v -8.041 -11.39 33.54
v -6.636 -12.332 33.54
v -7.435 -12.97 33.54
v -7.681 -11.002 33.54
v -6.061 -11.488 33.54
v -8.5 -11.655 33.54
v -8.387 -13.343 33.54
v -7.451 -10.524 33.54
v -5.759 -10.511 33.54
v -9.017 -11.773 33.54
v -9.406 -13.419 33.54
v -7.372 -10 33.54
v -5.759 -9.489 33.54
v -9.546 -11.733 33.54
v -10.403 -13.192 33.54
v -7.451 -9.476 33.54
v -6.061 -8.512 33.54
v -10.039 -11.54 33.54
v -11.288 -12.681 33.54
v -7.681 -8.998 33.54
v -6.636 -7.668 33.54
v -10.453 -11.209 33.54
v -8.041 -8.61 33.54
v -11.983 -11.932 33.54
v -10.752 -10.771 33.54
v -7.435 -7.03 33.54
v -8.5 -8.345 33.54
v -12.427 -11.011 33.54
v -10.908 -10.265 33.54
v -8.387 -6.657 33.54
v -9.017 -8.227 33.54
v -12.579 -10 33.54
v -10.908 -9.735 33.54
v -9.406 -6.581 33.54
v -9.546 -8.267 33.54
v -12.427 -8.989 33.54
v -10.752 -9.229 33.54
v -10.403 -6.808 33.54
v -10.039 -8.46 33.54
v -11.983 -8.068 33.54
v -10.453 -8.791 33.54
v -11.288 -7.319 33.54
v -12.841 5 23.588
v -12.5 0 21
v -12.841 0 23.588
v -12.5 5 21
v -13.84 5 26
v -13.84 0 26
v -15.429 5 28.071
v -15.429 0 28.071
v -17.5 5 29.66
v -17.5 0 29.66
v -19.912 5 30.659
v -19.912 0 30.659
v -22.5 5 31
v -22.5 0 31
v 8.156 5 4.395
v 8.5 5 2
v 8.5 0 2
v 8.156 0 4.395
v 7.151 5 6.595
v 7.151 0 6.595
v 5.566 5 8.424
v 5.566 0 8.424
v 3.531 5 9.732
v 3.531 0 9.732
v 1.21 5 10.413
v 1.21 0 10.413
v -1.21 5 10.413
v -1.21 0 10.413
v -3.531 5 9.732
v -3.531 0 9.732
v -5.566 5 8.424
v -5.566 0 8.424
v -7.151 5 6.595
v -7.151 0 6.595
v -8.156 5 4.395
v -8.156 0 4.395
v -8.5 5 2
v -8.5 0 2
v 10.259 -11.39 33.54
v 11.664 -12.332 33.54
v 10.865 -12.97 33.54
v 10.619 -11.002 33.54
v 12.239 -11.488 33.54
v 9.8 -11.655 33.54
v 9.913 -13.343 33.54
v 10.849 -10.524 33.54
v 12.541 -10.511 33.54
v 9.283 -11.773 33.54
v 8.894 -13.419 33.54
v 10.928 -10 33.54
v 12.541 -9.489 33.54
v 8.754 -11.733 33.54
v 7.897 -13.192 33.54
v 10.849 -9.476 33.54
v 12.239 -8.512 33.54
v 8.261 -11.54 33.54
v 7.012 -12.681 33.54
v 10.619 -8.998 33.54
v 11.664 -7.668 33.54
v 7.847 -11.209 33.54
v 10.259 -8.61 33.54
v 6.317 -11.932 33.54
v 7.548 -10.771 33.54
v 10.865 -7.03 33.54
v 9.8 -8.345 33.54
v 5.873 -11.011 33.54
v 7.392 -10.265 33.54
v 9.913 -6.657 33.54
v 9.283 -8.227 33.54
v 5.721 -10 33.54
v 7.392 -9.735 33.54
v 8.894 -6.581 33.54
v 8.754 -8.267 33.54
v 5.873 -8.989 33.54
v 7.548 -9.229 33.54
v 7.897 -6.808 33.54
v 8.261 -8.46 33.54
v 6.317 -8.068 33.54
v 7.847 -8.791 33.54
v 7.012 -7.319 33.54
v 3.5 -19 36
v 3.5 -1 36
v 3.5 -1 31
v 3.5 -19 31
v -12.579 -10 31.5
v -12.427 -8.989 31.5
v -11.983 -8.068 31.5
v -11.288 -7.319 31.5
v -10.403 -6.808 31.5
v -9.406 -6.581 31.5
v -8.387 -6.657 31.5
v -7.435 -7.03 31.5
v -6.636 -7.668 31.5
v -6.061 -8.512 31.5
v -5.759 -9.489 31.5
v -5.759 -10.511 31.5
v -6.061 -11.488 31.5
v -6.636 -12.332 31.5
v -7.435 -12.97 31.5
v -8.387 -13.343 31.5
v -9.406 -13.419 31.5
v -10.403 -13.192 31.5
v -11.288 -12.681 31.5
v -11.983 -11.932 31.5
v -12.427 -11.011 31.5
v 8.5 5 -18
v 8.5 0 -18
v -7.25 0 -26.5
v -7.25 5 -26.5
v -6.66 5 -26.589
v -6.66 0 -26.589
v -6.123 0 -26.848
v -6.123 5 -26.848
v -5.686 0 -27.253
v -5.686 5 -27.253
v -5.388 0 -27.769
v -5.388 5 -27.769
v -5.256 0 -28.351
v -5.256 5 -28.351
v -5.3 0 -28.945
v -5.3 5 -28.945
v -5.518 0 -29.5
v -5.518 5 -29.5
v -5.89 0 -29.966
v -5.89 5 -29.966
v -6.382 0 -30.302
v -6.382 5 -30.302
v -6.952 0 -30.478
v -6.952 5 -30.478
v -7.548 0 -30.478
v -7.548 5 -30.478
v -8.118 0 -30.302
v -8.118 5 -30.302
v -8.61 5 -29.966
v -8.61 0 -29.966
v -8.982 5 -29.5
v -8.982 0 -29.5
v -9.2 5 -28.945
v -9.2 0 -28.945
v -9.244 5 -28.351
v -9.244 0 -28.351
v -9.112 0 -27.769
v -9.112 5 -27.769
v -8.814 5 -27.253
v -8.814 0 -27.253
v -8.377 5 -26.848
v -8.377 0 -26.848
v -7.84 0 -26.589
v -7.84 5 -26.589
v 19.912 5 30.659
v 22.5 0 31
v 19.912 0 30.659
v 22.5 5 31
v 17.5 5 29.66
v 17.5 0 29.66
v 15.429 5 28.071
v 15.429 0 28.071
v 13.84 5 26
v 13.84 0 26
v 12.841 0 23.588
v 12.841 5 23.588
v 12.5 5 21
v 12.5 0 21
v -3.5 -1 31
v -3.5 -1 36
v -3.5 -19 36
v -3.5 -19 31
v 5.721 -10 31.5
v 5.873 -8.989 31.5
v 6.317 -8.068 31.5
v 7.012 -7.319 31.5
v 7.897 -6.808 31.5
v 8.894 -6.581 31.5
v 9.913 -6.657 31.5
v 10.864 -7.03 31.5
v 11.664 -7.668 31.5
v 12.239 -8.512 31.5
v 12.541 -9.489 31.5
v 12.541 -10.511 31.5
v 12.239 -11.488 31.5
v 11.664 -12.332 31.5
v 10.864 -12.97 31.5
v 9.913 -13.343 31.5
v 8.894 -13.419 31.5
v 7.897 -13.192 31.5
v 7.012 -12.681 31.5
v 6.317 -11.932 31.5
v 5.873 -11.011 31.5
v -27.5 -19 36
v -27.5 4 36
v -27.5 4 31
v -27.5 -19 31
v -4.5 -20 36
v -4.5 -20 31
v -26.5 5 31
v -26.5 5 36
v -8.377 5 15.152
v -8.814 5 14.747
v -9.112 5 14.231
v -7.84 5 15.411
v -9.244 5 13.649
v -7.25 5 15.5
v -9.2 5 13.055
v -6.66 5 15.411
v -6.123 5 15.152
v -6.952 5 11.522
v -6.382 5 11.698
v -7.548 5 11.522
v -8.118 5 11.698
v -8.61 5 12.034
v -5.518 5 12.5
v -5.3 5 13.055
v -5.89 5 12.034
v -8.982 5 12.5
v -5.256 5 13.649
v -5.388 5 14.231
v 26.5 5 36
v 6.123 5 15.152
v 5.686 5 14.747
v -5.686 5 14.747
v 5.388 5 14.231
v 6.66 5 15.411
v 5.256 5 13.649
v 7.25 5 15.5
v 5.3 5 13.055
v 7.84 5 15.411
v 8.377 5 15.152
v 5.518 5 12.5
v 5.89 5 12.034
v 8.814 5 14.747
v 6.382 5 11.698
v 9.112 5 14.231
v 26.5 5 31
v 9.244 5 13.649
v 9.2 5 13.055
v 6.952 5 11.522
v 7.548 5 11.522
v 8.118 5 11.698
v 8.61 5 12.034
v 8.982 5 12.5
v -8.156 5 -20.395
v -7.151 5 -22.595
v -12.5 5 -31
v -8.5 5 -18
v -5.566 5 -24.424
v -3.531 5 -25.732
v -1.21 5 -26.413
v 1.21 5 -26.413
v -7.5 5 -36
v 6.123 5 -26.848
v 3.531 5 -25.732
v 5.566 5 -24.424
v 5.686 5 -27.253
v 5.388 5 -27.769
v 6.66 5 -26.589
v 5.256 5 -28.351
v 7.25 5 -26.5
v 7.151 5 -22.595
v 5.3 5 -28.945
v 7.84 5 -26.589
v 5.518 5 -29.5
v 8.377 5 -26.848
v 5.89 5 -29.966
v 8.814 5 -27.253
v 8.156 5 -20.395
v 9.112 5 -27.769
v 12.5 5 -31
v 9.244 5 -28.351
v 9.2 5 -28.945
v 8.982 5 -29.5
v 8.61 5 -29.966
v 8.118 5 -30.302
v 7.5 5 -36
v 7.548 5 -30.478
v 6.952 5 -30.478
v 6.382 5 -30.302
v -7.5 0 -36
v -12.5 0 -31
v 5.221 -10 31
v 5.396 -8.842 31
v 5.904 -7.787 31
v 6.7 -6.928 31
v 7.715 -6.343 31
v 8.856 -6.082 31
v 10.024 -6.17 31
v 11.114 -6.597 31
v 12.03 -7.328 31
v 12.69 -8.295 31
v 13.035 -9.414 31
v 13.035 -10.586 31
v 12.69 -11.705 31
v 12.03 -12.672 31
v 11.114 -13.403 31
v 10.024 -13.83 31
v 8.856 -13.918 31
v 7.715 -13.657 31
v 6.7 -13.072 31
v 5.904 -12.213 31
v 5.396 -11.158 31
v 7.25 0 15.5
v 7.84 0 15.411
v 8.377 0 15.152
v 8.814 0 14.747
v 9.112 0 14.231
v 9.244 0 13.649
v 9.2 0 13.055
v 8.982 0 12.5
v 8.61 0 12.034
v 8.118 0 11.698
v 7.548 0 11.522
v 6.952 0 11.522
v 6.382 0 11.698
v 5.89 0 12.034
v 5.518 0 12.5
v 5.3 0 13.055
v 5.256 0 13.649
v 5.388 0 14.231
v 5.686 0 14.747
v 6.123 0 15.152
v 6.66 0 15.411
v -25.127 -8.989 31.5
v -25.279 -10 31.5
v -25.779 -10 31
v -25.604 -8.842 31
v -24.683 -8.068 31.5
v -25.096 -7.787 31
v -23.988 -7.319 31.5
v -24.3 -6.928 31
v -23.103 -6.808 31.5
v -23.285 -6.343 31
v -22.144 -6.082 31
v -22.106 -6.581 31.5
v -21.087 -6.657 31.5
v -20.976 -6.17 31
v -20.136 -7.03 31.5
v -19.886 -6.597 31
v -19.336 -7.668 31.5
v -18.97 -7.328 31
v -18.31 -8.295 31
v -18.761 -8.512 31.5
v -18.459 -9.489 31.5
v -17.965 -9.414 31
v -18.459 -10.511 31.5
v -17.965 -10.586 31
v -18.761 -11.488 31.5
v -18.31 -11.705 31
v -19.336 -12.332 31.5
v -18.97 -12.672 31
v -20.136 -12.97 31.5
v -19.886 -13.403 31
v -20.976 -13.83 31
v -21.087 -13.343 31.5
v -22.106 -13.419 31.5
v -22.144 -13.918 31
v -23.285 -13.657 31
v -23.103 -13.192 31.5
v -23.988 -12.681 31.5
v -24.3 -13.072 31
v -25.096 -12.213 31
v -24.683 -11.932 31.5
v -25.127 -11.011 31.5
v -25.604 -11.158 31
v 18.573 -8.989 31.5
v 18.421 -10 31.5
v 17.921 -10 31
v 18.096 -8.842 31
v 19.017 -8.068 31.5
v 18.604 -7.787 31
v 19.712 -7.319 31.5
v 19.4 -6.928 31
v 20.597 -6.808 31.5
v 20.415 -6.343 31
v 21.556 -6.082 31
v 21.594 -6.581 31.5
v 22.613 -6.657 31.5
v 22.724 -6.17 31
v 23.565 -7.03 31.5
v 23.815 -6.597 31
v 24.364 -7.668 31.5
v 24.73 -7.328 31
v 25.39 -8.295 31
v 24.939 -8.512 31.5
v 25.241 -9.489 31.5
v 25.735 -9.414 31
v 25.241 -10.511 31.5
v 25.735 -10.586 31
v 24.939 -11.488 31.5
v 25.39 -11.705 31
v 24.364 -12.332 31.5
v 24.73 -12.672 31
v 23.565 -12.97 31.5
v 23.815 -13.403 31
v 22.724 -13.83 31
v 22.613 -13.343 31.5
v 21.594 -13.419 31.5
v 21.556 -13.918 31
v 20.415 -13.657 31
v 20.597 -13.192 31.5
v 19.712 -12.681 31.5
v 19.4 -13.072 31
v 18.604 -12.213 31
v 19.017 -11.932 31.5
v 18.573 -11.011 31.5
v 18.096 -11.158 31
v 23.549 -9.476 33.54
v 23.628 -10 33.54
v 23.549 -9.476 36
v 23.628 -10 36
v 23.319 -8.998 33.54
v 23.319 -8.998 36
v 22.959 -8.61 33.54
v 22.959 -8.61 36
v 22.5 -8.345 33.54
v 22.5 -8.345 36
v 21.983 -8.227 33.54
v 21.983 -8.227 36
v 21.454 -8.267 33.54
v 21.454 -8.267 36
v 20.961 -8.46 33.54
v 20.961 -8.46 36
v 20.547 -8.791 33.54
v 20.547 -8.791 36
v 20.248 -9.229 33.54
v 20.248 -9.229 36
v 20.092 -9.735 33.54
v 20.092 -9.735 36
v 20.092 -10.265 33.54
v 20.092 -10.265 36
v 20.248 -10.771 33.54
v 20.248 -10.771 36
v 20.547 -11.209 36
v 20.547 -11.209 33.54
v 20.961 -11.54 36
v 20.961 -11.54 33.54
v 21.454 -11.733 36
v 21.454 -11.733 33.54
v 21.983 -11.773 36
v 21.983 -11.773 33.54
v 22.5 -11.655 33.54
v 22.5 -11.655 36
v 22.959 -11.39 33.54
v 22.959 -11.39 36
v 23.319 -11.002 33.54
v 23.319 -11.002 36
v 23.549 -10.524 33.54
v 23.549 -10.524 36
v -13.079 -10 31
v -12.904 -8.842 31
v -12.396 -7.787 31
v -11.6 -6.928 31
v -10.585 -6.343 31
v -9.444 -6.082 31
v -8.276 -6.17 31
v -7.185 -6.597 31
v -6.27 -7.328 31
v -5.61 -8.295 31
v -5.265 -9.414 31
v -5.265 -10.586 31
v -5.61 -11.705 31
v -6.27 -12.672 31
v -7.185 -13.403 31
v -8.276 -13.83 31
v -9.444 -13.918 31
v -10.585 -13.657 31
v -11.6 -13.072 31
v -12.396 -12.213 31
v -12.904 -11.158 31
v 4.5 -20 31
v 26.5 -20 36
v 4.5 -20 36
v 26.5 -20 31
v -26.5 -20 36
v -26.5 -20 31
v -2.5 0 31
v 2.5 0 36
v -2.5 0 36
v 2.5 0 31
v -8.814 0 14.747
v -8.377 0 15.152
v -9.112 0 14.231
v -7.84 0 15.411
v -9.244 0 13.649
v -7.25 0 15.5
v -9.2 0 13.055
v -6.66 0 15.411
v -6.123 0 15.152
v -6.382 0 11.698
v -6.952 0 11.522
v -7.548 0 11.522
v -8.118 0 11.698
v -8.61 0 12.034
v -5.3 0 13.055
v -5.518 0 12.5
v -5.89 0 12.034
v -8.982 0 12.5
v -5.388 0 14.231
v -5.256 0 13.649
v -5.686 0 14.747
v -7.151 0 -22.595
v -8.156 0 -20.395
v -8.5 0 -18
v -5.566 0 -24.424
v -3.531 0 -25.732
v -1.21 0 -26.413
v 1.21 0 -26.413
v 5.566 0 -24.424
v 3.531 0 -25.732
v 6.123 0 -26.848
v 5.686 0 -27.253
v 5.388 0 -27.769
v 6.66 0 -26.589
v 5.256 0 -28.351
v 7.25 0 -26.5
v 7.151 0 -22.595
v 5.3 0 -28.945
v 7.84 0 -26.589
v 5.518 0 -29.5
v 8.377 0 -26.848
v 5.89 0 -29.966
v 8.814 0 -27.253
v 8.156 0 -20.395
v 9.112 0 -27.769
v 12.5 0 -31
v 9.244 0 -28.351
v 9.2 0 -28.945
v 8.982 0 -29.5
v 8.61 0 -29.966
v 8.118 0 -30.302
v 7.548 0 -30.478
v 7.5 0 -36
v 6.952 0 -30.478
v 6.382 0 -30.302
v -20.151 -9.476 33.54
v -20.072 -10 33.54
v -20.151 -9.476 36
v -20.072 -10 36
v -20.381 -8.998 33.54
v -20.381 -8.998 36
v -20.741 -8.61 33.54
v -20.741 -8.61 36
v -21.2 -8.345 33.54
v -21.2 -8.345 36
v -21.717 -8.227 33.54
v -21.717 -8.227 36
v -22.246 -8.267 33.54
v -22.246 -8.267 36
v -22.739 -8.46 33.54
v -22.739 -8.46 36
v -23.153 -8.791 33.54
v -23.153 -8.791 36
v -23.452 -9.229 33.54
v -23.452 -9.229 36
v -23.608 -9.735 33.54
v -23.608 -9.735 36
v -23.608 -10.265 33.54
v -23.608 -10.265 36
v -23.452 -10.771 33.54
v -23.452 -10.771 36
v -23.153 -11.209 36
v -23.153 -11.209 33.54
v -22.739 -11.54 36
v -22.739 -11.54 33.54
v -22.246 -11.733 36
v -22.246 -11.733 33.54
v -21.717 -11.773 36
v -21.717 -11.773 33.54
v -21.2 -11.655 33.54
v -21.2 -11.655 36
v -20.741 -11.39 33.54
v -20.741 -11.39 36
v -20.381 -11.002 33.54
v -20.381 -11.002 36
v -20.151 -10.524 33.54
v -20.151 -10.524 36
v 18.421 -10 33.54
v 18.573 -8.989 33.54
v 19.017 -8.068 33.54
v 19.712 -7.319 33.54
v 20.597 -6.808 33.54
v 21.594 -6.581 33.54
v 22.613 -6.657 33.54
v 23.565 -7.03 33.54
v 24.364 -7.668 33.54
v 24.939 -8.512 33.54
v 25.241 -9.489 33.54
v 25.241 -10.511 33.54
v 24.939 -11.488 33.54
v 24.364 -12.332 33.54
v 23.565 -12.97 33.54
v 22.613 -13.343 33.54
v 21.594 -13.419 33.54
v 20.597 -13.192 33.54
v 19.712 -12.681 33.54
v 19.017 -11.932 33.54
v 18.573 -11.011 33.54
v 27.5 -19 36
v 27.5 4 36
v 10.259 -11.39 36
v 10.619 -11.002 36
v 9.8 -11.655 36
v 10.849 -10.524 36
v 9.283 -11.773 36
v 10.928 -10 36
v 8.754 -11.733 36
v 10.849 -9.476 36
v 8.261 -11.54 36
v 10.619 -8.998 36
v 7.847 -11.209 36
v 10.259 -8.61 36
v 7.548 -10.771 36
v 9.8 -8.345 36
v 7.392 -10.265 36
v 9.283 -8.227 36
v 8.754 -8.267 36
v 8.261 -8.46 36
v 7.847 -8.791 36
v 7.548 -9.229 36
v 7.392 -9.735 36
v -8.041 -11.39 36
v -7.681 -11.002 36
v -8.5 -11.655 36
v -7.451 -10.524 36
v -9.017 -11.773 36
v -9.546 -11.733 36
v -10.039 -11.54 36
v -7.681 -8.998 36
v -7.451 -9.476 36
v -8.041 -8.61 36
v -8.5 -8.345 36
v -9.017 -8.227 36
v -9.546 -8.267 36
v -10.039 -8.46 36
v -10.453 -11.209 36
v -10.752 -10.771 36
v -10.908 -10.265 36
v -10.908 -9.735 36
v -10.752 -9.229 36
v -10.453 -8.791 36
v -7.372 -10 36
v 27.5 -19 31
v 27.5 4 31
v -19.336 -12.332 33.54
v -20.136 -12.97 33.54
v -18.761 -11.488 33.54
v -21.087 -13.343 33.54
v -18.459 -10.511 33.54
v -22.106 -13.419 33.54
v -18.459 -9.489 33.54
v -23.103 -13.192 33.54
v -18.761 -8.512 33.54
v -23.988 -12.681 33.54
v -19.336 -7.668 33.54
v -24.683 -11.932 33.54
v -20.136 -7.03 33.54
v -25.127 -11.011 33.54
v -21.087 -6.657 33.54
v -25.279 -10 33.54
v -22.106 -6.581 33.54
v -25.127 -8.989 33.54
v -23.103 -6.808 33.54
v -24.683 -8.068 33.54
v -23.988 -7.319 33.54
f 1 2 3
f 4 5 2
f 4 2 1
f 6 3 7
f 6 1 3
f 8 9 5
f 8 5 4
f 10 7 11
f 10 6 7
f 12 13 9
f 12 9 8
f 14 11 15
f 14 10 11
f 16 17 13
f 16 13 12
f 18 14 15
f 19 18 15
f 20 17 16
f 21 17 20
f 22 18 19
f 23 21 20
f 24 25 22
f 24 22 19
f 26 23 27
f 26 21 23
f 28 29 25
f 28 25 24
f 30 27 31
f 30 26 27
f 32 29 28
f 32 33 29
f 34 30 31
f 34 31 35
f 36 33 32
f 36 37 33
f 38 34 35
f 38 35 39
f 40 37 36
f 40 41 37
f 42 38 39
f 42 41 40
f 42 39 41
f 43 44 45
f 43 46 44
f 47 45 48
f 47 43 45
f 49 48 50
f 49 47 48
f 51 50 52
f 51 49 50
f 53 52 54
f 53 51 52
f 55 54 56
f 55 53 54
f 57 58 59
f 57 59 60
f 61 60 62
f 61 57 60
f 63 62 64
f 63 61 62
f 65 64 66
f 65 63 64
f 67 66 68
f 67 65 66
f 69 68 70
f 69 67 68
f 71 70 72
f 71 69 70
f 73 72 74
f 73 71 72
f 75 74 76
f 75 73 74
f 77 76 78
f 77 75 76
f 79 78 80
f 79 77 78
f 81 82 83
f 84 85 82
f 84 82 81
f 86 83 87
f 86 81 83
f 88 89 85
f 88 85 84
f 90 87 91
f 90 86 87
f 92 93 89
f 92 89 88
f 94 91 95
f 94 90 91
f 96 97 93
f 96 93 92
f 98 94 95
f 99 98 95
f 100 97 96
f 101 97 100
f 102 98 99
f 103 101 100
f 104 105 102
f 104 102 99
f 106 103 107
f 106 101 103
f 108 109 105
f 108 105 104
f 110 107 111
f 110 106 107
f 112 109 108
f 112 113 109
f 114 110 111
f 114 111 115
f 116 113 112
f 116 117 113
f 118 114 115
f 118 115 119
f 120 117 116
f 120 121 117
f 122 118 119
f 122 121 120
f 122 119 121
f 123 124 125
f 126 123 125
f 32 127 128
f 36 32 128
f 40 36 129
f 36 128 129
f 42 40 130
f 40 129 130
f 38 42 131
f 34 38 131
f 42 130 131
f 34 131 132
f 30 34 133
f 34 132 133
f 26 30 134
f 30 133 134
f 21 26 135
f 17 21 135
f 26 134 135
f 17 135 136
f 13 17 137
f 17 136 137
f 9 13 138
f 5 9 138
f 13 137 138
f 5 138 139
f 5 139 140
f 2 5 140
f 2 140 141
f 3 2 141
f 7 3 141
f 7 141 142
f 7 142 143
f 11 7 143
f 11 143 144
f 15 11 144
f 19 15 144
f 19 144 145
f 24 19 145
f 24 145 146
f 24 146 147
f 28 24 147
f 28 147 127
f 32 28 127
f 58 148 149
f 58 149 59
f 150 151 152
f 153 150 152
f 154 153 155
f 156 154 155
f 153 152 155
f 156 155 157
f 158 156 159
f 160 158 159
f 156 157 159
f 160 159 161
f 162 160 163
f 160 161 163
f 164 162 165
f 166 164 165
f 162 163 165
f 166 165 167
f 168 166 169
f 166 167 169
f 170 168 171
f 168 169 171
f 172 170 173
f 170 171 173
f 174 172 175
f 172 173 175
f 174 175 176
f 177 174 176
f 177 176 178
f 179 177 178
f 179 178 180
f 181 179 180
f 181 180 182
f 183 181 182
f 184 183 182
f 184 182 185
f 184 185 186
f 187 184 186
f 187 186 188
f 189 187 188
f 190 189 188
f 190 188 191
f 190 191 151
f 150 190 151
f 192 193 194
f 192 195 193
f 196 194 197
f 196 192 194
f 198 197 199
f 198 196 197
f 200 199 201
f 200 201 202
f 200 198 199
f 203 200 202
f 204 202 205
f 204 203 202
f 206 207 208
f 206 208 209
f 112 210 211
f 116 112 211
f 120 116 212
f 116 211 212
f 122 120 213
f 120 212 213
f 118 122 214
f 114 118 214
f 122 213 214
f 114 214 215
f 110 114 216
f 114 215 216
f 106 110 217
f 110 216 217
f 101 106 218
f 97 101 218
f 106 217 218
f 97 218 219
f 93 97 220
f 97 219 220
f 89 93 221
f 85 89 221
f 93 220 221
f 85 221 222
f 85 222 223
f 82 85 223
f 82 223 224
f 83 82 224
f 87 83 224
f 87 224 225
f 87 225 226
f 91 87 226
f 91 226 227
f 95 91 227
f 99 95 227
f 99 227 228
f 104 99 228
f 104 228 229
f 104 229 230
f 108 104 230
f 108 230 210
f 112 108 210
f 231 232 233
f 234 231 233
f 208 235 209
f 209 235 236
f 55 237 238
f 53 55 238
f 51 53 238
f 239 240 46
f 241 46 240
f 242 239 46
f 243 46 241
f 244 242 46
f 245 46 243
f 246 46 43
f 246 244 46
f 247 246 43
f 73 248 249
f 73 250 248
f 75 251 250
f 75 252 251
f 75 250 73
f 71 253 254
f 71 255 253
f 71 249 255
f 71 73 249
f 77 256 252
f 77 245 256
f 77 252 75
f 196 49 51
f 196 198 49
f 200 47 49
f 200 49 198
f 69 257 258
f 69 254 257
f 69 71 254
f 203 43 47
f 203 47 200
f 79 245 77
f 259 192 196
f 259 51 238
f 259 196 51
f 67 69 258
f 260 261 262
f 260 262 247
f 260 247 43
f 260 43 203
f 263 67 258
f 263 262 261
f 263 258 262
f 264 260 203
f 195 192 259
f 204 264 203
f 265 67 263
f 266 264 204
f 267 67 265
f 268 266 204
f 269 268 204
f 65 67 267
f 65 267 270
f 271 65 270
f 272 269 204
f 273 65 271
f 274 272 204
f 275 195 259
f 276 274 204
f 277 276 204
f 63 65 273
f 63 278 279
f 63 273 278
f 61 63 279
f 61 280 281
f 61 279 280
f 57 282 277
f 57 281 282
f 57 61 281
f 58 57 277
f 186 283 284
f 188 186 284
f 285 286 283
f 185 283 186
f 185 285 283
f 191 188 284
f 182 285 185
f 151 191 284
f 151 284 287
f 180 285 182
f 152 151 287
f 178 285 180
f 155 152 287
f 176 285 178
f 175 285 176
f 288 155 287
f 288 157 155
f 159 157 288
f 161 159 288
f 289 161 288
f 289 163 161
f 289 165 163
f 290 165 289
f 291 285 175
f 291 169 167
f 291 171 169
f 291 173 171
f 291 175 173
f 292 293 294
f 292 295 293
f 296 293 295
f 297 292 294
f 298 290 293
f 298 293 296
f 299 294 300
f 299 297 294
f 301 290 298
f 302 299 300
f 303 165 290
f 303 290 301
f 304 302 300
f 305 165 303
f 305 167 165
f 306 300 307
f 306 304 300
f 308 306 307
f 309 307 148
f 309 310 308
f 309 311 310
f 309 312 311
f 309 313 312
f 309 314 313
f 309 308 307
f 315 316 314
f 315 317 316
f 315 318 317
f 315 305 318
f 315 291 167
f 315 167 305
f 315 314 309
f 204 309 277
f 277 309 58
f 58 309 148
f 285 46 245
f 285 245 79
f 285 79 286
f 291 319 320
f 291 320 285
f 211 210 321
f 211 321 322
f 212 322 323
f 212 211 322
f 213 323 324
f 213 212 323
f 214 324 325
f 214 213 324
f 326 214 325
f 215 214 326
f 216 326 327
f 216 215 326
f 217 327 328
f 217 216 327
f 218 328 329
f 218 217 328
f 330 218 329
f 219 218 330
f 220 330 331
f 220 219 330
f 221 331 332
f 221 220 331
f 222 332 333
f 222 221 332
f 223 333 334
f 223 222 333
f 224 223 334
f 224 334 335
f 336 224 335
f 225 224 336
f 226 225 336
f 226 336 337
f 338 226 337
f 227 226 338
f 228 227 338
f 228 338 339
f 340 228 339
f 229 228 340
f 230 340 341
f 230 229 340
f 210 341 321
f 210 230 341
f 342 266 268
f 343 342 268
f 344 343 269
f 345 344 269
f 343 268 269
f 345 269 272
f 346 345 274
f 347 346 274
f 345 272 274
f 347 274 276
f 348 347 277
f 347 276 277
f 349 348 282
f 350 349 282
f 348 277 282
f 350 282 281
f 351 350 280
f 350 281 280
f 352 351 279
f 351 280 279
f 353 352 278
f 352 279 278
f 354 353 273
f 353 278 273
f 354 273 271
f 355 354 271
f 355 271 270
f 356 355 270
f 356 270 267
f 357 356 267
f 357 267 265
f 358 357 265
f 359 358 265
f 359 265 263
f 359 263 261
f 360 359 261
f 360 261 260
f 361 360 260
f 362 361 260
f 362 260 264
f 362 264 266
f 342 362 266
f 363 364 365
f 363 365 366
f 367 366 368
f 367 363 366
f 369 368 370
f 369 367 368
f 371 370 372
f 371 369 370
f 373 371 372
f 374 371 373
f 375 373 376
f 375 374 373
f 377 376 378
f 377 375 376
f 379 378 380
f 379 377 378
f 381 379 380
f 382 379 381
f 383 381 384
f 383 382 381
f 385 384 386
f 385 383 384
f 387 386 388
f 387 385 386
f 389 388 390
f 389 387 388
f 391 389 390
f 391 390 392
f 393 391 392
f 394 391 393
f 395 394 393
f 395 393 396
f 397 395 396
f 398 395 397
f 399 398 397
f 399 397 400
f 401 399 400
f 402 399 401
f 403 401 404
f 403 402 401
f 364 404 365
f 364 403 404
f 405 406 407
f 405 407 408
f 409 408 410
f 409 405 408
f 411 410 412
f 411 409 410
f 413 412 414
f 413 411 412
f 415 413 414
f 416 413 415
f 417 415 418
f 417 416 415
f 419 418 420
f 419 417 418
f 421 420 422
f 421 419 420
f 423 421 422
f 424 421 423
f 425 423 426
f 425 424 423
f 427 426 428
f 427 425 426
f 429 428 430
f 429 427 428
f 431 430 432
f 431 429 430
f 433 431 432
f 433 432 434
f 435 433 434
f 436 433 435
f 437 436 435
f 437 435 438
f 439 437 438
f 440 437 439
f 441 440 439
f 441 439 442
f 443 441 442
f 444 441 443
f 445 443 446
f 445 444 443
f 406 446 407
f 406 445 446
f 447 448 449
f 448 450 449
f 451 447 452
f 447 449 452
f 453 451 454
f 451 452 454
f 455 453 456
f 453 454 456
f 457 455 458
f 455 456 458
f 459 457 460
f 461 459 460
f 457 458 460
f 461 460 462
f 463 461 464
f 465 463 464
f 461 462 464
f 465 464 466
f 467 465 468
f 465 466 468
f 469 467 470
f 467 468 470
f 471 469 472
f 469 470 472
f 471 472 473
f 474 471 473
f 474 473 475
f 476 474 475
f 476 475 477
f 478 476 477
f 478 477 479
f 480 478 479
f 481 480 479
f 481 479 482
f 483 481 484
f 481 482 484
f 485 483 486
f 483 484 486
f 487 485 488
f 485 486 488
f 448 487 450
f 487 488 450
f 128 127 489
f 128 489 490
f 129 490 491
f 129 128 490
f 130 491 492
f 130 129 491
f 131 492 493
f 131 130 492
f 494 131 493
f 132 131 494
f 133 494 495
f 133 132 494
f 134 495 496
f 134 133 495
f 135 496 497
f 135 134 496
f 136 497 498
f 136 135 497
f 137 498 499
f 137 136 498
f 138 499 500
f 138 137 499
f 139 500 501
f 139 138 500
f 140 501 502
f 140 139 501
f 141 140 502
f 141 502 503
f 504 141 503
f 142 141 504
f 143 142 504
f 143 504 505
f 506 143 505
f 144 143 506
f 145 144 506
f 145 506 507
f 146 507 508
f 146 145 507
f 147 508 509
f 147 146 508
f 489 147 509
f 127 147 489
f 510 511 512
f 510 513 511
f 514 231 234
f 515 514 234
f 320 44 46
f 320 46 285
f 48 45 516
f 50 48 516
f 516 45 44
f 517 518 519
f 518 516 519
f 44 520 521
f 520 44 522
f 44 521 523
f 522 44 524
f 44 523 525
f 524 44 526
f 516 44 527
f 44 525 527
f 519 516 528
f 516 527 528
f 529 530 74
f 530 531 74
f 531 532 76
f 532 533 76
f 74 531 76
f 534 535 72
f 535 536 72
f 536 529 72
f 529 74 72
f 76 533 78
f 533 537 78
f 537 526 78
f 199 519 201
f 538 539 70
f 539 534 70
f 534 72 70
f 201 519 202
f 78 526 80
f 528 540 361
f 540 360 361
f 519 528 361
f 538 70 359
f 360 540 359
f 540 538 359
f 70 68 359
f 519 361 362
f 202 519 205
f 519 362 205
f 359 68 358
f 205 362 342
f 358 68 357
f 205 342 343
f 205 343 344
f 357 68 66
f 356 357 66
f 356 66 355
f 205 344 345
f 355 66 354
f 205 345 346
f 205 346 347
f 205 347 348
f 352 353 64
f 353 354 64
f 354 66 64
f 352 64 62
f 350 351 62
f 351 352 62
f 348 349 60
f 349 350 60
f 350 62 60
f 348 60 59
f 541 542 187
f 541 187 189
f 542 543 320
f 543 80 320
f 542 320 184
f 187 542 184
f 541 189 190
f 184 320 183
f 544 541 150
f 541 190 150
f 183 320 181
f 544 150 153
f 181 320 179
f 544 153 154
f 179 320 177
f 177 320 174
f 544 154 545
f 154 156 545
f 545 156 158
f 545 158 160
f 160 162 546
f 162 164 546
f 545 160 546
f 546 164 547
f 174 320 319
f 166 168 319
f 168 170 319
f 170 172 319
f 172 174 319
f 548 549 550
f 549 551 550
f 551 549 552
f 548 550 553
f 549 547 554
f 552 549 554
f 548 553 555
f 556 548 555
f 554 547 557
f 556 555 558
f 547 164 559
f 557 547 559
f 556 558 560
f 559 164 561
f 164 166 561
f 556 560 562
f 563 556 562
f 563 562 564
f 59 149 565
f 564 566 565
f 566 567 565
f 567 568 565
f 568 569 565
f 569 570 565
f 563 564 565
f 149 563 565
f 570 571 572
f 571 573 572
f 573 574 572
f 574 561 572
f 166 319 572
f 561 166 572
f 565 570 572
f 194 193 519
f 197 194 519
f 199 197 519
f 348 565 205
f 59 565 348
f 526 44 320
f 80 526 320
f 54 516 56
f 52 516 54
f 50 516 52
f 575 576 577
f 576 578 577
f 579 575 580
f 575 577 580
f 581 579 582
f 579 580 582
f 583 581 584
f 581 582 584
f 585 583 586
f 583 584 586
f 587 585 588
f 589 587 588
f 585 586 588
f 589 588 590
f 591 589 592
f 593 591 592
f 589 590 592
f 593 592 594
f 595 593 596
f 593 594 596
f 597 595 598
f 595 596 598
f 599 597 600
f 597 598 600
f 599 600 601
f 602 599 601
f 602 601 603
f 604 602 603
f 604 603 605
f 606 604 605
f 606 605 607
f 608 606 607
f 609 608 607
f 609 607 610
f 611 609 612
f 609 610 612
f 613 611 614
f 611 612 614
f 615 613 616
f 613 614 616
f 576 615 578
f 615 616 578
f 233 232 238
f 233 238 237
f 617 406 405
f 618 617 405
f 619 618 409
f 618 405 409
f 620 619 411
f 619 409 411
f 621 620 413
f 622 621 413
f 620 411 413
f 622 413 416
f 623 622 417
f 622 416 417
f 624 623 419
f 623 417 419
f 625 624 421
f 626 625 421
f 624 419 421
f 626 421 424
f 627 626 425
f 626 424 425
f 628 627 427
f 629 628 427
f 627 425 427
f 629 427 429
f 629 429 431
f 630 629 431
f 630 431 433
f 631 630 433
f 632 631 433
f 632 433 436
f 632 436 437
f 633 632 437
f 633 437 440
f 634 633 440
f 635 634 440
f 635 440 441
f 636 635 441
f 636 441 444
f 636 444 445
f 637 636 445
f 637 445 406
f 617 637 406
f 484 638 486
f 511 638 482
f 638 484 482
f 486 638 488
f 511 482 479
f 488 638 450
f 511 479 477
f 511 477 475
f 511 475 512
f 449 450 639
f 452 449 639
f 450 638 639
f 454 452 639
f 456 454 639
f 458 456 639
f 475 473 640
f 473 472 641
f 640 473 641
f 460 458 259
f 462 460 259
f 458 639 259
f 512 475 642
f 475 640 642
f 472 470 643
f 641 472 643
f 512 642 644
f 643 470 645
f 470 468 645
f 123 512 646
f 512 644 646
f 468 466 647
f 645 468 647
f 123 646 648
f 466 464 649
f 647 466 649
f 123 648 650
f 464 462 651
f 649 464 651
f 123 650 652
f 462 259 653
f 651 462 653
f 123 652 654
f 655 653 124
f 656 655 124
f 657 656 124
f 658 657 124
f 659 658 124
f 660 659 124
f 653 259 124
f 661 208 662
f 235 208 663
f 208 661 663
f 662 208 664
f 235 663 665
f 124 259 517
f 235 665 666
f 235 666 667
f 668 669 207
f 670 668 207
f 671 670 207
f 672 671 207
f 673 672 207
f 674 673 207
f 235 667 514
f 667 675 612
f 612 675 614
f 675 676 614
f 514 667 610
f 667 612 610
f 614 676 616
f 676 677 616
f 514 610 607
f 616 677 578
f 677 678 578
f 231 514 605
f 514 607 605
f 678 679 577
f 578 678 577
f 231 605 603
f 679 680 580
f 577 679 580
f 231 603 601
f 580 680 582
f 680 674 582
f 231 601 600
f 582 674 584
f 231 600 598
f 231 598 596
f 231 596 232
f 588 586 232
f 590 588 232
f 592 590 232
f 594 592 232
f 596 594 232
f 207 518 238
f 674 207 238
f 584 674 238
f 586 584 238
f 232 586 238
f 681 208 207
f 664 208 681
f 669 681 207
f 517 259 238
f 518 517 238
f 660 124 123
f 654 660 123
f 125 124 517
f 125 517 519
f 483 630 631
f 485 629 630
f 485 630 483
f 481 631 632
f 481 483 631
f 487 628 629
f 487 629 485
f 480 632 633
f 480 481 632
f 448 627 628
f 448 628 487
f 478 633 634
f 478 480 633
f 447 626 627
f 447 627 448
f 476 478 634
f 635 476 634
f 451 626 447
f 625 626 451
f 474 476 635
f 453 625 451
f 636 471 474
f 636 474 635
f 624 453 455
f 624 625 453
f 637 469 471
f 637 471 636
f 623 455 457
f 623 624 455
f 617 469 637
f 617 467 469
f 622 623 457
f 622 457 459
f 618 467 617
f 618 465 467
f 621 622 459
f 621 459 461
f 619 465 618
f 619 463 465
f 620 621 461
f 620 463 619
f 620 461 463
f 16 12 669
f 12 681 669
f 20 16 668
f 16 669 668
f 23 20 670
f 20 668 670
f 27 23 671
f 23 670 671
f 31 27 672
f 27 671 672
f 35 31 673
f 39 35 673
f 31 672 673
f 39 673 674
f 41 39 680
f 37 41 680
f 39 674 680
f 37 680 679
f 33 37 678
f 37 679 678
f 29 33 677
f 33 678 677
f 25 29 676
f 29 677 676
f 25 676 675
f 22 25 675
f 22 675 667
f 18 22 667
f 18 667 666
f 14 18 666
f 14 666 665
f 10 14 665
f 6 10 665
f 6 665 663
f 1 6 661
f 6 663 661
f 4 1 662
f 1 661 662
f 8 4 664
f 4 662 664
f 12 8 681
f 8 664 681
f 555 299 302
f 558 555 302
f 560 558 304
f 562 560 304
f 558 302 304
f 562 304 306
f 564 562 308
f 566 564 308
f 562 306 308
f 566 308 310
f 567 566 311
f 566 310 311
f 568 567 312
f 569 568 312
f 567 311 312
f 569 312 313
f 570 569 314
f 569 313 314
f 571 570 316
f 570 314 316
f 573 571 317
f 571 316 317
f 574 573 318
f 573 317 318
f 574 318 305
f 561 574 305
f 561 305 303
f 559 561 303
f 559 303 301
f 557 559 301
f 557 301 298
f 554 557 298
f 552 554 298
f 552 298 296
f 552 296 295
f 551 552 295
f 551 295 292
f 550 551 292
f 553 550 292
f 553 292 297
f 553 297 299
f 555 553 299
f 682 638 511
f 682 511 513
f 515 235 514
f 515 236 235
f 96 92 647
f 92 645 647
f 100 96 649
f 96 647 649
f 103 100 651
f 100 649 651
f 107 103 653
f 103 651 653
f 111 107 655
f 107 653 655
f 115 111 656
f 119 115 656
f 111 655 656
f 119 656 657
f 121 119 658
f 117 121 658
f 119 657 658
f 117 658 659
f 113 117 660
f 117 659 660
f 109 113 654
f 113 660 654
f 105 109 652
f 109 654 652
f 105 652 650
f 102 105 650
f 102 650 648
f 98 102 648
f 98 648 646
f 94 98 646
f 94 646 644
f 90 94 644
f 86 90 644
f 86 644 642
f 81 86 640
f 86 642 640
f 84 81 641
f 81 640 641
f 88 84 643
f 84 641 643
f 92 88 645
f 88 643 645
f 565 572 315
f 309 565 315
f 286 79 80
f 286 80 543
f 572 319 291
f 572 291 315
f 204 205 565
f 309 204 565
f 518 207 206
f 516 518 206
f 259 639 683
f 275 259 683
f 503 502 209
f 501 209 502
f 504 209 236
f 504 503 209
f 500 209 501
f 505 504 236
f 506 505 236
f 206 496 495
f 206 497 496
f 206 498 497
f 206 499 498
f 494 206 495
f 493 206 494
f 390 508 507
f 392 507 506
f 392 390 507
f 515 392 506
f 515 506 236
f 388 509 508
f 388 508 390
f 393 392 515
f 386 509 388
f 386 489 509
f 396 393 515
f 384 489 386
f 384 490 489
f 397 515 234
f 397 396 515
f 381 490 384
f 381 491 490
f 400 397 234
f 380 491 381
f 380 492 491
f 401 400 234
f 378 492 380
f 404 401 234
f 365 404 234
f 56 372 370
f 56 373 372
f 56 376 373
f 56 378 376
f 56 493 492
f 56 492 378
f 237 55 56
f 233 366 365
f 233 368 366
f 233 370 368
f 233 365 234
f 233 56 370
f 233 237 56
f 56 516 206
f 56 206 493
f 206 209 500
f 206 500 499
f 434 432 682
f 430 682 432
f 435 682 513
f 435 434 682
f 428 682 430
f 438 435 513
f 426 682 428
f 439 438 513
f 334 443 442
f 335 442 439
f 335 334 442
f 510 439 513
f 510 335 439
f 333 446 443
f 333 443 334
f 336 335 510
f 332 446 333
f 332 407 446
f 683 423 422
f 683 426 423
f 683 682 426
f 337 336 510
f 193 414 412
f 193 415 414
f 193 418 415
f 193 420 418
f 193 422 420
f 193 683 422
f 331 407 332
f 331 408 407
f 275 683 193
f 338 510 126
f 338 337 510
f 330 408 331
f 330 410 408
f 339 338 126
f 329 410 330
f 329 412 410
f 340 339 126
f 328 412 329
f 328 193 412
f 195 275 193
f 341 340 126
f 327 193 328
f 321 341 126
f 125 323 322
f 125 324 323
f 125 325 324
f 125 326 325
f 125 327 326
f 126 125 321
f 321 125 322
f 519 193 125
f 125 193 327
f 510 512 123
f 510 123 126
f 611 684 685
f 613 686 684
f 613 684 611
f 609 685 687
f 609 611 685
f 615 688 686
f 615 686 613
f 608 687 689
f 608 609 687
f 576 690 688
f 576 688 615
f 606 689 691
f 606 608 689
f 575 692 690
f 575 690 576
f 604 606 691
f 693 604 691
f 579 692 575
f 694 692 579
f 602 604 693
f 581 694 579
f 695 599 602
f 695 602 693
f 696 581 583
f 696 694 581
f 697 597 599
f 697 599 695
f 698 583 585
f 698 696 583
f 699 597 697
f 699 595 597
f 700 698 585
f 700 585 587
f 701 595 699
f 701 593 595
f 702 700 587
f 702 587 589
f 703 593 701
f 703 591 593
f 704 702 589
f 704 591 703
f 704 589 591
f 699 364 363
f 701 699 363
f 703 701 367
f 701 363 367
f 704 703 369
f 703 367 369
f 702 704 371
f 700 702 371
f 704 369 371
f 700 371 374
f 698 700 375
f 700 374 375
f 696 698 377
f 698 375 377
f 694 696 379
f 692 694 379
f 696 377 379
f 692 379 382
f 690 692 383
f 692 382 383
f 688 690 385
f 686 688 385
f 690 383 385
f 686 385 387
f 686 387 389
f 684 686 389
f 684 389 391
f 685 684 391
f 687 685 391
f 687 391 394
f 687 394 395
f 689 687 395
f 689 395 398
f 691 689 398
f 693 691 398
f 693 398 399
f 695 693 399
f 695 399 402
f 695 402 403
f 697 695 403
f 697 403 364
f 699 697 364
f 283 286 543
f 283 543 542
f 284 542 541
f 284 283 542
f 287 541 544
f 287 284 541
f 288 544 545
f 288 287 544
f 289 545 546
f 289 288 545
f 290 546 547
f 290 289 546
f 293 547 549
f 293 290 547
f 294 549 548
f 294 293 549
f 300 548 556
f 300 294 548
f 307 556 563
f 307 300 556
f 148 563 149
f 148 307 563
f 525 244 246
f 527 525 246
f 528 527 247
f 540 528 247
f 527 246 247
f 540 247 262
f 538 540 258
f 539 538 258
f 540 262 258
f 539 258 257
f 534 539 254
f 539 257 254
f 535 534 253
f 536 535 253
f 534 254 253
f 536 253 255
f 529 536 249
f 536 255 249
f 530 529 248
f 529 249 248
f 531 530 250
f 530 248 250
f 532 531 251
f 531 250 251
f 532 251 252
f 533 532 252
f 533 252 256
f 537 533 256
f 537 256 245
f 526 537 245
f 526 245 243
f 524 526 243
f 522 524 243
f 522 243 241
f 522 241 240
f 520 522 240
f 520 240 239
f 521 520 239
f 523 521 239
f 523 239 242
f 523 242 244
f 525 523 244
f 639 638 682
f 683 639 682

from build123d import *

# Parameters (mm, degrees)
SKETCH1_W           = 25
SKETCH1_H           = 72
SKETCH1_W_2         = 15
SKETCH1_H_2         = 5
BOSS_EXTRUDE1_DEPTH = 5
SKETCH2_R           = 2
CUT_EXTRUDE1_DEPTH  = 46.576858163
CHAMFER1_SIZE       = 5
CUT_EXTRUDE2_DEPTH  = 46.576858163
SKETCH5_W           = 24
SKETCH5_H           = 5
BOSS_EXTRUDE3_DEPTH = 20
FILLET2_R           = 10
CHAMFER3_SIZE       = 1
HOLE1_D             = 3.556
HOLE1_CBORE_D       = 6.858
HOLE1_CBORE_DEPTH   = 2.54
CHAMFER4_SIZE       = 0.5


with BuildPart() as part:
    # Sketch1 → Boss-Extrude1 (new body)
    with BuildSketch(Plane(origin=(0, 0, 0), x_dir=(1, 0, 0), z_dir=(0, 1, 0))):
        Rectangle(SKETCH1_W, SKETCH1_H)
        with Locations((-20, -33.5)):
            Rectangle(SKETCH1_W_2, SKETCH1_H_2)
        with Locations((20, -33.5)):
            Rectangle(SKETCH1_W_2, SKETCH1_H_2)
    extrude(amount=BOSS_EXTRUDE1_DEPTH)

    # Sketch2 → Cut-Extrude1 (cut, through all)
    with BuildSketch(Plane(origin=(0, 5, 0), x_dir=(1, 0, 0), z_dir=(0, 1, 0))):
        with Locations(Location((-7.25, 28.5, 0), (0, 0, 270))):
            Circle(SKETCH2_R)
        with Locations(Location((7.25, 28.5, 0), (0, 0, 270))):
            Circle(SKETCH2_R)
        with Locations(Location((-7.25, -13.5, 0), (0, 0, 270))):
            Circle(SKETCH2_R)
        with Locations(Location((7.25, -13.5, 0), (0, 0, 270))):
            Circle(SKETCH2_R)
    extrude(amount=-CUT_EXTRUDE1_DEPTH, mode=Mode.SUBTRACT)

    # Chamfer1
    chamfer1_edges = [part.edges().sort_by_distance(p)[0] for p in [
        (-12.5, 2.5, -36),
        (12.5, 2.5, -36),
    ]]
    chamfer(chamfer1_edges, length=CHAMFER1_SIZE)

    # Sketch3 → Cut-Extrude2 (cut, through all)
    with BuildSketch(Plane(origin=(0, 5, 0), x_dir=(1, 0, 0), z_dir=(0, 1, 0))):
        with BuildLine():
            Line((-8.5, -2), (-8.5, 18))
            ThreePointArc((-8.5, 18), (0, 26.5), (8.5, 18))
            Line((8.5, 18), (8.5, -2))
            ThreePointArc((8.5, -2), (0, -10.5), (-8.5, -2))
        make_face()
    extrude(amount=-CUT_EXTRUDE2_DEPTH, mode=Mode.SUBTRACT)

    # Sketch5 → Boss-Extrude3 (add)
    with BuildSketch(Plane(origin=(0, 0, 0), x_dir=(-1, 0, 0), z_dir=(0, -1, 0))):
        with Locations((15.5, -33.5)):
            Rectangle(SKETCH5_W, SKETCH5_H)
        with Locations((-15.5, -33.5)):
            Rectangle(SKETCH5_W, SKETCH5_H)
    extrude(amount=BOSS_EXTRUDE3_DEPTH)

    # Fillet2
    fillet2_edges = [part.edges().sort_by_distance(p)[0] for p in [
        (-12.5, 2.5, 31),
        (12.5, 2.5, 31),
    ]]
    fillet(fillet2_edges, radius=FILLET2_R)

    # Chamfer3
    chamfer3_edges = [part.edges().sort_by_distance(p)[0] for p in [
        (27.5, 5, 33.5),
        (-27.5, 5, 33.5),
        (-3.5, 0, 33.5),
        (-27.5, -20, 33.5),
        (-3.5, -20, 33.5),
        (3.5, 0, 33.5),
        (27.5, -20, 33.5),
        (3.5, -20, 33.5),
    ]]
    chamfer(chamfer3_edges, length=CHAMFER3_SIZE)

    # Hole1 (through all)
    with Locations(Plane(origin=(0, 0, 31), x_dir=(-1, 0, 0), z_dir=(0, 0, -1))):
        with Locations((-21.85, -10), (-9.15, -10), (9.15, -10), (21.85, -10)):
            CounterBoreHole(HOLE1_D / 2, HOLE1_CBORE_D / 2, HOLE1_CBORE_DEPTH)

    # Chamfer4
    chamfer4_edges = [part.edges().sort_by_distance(p)[0] for p in [
        (-18.421, -10, 31),
        (-5.721, -10, 31),
        (12.579, -10, 31),
        (25.279, -10, 31),
    ]]
    chamfer(chamfer4_edges, length=CHAMFER4_SIZE)


solid = part.part
